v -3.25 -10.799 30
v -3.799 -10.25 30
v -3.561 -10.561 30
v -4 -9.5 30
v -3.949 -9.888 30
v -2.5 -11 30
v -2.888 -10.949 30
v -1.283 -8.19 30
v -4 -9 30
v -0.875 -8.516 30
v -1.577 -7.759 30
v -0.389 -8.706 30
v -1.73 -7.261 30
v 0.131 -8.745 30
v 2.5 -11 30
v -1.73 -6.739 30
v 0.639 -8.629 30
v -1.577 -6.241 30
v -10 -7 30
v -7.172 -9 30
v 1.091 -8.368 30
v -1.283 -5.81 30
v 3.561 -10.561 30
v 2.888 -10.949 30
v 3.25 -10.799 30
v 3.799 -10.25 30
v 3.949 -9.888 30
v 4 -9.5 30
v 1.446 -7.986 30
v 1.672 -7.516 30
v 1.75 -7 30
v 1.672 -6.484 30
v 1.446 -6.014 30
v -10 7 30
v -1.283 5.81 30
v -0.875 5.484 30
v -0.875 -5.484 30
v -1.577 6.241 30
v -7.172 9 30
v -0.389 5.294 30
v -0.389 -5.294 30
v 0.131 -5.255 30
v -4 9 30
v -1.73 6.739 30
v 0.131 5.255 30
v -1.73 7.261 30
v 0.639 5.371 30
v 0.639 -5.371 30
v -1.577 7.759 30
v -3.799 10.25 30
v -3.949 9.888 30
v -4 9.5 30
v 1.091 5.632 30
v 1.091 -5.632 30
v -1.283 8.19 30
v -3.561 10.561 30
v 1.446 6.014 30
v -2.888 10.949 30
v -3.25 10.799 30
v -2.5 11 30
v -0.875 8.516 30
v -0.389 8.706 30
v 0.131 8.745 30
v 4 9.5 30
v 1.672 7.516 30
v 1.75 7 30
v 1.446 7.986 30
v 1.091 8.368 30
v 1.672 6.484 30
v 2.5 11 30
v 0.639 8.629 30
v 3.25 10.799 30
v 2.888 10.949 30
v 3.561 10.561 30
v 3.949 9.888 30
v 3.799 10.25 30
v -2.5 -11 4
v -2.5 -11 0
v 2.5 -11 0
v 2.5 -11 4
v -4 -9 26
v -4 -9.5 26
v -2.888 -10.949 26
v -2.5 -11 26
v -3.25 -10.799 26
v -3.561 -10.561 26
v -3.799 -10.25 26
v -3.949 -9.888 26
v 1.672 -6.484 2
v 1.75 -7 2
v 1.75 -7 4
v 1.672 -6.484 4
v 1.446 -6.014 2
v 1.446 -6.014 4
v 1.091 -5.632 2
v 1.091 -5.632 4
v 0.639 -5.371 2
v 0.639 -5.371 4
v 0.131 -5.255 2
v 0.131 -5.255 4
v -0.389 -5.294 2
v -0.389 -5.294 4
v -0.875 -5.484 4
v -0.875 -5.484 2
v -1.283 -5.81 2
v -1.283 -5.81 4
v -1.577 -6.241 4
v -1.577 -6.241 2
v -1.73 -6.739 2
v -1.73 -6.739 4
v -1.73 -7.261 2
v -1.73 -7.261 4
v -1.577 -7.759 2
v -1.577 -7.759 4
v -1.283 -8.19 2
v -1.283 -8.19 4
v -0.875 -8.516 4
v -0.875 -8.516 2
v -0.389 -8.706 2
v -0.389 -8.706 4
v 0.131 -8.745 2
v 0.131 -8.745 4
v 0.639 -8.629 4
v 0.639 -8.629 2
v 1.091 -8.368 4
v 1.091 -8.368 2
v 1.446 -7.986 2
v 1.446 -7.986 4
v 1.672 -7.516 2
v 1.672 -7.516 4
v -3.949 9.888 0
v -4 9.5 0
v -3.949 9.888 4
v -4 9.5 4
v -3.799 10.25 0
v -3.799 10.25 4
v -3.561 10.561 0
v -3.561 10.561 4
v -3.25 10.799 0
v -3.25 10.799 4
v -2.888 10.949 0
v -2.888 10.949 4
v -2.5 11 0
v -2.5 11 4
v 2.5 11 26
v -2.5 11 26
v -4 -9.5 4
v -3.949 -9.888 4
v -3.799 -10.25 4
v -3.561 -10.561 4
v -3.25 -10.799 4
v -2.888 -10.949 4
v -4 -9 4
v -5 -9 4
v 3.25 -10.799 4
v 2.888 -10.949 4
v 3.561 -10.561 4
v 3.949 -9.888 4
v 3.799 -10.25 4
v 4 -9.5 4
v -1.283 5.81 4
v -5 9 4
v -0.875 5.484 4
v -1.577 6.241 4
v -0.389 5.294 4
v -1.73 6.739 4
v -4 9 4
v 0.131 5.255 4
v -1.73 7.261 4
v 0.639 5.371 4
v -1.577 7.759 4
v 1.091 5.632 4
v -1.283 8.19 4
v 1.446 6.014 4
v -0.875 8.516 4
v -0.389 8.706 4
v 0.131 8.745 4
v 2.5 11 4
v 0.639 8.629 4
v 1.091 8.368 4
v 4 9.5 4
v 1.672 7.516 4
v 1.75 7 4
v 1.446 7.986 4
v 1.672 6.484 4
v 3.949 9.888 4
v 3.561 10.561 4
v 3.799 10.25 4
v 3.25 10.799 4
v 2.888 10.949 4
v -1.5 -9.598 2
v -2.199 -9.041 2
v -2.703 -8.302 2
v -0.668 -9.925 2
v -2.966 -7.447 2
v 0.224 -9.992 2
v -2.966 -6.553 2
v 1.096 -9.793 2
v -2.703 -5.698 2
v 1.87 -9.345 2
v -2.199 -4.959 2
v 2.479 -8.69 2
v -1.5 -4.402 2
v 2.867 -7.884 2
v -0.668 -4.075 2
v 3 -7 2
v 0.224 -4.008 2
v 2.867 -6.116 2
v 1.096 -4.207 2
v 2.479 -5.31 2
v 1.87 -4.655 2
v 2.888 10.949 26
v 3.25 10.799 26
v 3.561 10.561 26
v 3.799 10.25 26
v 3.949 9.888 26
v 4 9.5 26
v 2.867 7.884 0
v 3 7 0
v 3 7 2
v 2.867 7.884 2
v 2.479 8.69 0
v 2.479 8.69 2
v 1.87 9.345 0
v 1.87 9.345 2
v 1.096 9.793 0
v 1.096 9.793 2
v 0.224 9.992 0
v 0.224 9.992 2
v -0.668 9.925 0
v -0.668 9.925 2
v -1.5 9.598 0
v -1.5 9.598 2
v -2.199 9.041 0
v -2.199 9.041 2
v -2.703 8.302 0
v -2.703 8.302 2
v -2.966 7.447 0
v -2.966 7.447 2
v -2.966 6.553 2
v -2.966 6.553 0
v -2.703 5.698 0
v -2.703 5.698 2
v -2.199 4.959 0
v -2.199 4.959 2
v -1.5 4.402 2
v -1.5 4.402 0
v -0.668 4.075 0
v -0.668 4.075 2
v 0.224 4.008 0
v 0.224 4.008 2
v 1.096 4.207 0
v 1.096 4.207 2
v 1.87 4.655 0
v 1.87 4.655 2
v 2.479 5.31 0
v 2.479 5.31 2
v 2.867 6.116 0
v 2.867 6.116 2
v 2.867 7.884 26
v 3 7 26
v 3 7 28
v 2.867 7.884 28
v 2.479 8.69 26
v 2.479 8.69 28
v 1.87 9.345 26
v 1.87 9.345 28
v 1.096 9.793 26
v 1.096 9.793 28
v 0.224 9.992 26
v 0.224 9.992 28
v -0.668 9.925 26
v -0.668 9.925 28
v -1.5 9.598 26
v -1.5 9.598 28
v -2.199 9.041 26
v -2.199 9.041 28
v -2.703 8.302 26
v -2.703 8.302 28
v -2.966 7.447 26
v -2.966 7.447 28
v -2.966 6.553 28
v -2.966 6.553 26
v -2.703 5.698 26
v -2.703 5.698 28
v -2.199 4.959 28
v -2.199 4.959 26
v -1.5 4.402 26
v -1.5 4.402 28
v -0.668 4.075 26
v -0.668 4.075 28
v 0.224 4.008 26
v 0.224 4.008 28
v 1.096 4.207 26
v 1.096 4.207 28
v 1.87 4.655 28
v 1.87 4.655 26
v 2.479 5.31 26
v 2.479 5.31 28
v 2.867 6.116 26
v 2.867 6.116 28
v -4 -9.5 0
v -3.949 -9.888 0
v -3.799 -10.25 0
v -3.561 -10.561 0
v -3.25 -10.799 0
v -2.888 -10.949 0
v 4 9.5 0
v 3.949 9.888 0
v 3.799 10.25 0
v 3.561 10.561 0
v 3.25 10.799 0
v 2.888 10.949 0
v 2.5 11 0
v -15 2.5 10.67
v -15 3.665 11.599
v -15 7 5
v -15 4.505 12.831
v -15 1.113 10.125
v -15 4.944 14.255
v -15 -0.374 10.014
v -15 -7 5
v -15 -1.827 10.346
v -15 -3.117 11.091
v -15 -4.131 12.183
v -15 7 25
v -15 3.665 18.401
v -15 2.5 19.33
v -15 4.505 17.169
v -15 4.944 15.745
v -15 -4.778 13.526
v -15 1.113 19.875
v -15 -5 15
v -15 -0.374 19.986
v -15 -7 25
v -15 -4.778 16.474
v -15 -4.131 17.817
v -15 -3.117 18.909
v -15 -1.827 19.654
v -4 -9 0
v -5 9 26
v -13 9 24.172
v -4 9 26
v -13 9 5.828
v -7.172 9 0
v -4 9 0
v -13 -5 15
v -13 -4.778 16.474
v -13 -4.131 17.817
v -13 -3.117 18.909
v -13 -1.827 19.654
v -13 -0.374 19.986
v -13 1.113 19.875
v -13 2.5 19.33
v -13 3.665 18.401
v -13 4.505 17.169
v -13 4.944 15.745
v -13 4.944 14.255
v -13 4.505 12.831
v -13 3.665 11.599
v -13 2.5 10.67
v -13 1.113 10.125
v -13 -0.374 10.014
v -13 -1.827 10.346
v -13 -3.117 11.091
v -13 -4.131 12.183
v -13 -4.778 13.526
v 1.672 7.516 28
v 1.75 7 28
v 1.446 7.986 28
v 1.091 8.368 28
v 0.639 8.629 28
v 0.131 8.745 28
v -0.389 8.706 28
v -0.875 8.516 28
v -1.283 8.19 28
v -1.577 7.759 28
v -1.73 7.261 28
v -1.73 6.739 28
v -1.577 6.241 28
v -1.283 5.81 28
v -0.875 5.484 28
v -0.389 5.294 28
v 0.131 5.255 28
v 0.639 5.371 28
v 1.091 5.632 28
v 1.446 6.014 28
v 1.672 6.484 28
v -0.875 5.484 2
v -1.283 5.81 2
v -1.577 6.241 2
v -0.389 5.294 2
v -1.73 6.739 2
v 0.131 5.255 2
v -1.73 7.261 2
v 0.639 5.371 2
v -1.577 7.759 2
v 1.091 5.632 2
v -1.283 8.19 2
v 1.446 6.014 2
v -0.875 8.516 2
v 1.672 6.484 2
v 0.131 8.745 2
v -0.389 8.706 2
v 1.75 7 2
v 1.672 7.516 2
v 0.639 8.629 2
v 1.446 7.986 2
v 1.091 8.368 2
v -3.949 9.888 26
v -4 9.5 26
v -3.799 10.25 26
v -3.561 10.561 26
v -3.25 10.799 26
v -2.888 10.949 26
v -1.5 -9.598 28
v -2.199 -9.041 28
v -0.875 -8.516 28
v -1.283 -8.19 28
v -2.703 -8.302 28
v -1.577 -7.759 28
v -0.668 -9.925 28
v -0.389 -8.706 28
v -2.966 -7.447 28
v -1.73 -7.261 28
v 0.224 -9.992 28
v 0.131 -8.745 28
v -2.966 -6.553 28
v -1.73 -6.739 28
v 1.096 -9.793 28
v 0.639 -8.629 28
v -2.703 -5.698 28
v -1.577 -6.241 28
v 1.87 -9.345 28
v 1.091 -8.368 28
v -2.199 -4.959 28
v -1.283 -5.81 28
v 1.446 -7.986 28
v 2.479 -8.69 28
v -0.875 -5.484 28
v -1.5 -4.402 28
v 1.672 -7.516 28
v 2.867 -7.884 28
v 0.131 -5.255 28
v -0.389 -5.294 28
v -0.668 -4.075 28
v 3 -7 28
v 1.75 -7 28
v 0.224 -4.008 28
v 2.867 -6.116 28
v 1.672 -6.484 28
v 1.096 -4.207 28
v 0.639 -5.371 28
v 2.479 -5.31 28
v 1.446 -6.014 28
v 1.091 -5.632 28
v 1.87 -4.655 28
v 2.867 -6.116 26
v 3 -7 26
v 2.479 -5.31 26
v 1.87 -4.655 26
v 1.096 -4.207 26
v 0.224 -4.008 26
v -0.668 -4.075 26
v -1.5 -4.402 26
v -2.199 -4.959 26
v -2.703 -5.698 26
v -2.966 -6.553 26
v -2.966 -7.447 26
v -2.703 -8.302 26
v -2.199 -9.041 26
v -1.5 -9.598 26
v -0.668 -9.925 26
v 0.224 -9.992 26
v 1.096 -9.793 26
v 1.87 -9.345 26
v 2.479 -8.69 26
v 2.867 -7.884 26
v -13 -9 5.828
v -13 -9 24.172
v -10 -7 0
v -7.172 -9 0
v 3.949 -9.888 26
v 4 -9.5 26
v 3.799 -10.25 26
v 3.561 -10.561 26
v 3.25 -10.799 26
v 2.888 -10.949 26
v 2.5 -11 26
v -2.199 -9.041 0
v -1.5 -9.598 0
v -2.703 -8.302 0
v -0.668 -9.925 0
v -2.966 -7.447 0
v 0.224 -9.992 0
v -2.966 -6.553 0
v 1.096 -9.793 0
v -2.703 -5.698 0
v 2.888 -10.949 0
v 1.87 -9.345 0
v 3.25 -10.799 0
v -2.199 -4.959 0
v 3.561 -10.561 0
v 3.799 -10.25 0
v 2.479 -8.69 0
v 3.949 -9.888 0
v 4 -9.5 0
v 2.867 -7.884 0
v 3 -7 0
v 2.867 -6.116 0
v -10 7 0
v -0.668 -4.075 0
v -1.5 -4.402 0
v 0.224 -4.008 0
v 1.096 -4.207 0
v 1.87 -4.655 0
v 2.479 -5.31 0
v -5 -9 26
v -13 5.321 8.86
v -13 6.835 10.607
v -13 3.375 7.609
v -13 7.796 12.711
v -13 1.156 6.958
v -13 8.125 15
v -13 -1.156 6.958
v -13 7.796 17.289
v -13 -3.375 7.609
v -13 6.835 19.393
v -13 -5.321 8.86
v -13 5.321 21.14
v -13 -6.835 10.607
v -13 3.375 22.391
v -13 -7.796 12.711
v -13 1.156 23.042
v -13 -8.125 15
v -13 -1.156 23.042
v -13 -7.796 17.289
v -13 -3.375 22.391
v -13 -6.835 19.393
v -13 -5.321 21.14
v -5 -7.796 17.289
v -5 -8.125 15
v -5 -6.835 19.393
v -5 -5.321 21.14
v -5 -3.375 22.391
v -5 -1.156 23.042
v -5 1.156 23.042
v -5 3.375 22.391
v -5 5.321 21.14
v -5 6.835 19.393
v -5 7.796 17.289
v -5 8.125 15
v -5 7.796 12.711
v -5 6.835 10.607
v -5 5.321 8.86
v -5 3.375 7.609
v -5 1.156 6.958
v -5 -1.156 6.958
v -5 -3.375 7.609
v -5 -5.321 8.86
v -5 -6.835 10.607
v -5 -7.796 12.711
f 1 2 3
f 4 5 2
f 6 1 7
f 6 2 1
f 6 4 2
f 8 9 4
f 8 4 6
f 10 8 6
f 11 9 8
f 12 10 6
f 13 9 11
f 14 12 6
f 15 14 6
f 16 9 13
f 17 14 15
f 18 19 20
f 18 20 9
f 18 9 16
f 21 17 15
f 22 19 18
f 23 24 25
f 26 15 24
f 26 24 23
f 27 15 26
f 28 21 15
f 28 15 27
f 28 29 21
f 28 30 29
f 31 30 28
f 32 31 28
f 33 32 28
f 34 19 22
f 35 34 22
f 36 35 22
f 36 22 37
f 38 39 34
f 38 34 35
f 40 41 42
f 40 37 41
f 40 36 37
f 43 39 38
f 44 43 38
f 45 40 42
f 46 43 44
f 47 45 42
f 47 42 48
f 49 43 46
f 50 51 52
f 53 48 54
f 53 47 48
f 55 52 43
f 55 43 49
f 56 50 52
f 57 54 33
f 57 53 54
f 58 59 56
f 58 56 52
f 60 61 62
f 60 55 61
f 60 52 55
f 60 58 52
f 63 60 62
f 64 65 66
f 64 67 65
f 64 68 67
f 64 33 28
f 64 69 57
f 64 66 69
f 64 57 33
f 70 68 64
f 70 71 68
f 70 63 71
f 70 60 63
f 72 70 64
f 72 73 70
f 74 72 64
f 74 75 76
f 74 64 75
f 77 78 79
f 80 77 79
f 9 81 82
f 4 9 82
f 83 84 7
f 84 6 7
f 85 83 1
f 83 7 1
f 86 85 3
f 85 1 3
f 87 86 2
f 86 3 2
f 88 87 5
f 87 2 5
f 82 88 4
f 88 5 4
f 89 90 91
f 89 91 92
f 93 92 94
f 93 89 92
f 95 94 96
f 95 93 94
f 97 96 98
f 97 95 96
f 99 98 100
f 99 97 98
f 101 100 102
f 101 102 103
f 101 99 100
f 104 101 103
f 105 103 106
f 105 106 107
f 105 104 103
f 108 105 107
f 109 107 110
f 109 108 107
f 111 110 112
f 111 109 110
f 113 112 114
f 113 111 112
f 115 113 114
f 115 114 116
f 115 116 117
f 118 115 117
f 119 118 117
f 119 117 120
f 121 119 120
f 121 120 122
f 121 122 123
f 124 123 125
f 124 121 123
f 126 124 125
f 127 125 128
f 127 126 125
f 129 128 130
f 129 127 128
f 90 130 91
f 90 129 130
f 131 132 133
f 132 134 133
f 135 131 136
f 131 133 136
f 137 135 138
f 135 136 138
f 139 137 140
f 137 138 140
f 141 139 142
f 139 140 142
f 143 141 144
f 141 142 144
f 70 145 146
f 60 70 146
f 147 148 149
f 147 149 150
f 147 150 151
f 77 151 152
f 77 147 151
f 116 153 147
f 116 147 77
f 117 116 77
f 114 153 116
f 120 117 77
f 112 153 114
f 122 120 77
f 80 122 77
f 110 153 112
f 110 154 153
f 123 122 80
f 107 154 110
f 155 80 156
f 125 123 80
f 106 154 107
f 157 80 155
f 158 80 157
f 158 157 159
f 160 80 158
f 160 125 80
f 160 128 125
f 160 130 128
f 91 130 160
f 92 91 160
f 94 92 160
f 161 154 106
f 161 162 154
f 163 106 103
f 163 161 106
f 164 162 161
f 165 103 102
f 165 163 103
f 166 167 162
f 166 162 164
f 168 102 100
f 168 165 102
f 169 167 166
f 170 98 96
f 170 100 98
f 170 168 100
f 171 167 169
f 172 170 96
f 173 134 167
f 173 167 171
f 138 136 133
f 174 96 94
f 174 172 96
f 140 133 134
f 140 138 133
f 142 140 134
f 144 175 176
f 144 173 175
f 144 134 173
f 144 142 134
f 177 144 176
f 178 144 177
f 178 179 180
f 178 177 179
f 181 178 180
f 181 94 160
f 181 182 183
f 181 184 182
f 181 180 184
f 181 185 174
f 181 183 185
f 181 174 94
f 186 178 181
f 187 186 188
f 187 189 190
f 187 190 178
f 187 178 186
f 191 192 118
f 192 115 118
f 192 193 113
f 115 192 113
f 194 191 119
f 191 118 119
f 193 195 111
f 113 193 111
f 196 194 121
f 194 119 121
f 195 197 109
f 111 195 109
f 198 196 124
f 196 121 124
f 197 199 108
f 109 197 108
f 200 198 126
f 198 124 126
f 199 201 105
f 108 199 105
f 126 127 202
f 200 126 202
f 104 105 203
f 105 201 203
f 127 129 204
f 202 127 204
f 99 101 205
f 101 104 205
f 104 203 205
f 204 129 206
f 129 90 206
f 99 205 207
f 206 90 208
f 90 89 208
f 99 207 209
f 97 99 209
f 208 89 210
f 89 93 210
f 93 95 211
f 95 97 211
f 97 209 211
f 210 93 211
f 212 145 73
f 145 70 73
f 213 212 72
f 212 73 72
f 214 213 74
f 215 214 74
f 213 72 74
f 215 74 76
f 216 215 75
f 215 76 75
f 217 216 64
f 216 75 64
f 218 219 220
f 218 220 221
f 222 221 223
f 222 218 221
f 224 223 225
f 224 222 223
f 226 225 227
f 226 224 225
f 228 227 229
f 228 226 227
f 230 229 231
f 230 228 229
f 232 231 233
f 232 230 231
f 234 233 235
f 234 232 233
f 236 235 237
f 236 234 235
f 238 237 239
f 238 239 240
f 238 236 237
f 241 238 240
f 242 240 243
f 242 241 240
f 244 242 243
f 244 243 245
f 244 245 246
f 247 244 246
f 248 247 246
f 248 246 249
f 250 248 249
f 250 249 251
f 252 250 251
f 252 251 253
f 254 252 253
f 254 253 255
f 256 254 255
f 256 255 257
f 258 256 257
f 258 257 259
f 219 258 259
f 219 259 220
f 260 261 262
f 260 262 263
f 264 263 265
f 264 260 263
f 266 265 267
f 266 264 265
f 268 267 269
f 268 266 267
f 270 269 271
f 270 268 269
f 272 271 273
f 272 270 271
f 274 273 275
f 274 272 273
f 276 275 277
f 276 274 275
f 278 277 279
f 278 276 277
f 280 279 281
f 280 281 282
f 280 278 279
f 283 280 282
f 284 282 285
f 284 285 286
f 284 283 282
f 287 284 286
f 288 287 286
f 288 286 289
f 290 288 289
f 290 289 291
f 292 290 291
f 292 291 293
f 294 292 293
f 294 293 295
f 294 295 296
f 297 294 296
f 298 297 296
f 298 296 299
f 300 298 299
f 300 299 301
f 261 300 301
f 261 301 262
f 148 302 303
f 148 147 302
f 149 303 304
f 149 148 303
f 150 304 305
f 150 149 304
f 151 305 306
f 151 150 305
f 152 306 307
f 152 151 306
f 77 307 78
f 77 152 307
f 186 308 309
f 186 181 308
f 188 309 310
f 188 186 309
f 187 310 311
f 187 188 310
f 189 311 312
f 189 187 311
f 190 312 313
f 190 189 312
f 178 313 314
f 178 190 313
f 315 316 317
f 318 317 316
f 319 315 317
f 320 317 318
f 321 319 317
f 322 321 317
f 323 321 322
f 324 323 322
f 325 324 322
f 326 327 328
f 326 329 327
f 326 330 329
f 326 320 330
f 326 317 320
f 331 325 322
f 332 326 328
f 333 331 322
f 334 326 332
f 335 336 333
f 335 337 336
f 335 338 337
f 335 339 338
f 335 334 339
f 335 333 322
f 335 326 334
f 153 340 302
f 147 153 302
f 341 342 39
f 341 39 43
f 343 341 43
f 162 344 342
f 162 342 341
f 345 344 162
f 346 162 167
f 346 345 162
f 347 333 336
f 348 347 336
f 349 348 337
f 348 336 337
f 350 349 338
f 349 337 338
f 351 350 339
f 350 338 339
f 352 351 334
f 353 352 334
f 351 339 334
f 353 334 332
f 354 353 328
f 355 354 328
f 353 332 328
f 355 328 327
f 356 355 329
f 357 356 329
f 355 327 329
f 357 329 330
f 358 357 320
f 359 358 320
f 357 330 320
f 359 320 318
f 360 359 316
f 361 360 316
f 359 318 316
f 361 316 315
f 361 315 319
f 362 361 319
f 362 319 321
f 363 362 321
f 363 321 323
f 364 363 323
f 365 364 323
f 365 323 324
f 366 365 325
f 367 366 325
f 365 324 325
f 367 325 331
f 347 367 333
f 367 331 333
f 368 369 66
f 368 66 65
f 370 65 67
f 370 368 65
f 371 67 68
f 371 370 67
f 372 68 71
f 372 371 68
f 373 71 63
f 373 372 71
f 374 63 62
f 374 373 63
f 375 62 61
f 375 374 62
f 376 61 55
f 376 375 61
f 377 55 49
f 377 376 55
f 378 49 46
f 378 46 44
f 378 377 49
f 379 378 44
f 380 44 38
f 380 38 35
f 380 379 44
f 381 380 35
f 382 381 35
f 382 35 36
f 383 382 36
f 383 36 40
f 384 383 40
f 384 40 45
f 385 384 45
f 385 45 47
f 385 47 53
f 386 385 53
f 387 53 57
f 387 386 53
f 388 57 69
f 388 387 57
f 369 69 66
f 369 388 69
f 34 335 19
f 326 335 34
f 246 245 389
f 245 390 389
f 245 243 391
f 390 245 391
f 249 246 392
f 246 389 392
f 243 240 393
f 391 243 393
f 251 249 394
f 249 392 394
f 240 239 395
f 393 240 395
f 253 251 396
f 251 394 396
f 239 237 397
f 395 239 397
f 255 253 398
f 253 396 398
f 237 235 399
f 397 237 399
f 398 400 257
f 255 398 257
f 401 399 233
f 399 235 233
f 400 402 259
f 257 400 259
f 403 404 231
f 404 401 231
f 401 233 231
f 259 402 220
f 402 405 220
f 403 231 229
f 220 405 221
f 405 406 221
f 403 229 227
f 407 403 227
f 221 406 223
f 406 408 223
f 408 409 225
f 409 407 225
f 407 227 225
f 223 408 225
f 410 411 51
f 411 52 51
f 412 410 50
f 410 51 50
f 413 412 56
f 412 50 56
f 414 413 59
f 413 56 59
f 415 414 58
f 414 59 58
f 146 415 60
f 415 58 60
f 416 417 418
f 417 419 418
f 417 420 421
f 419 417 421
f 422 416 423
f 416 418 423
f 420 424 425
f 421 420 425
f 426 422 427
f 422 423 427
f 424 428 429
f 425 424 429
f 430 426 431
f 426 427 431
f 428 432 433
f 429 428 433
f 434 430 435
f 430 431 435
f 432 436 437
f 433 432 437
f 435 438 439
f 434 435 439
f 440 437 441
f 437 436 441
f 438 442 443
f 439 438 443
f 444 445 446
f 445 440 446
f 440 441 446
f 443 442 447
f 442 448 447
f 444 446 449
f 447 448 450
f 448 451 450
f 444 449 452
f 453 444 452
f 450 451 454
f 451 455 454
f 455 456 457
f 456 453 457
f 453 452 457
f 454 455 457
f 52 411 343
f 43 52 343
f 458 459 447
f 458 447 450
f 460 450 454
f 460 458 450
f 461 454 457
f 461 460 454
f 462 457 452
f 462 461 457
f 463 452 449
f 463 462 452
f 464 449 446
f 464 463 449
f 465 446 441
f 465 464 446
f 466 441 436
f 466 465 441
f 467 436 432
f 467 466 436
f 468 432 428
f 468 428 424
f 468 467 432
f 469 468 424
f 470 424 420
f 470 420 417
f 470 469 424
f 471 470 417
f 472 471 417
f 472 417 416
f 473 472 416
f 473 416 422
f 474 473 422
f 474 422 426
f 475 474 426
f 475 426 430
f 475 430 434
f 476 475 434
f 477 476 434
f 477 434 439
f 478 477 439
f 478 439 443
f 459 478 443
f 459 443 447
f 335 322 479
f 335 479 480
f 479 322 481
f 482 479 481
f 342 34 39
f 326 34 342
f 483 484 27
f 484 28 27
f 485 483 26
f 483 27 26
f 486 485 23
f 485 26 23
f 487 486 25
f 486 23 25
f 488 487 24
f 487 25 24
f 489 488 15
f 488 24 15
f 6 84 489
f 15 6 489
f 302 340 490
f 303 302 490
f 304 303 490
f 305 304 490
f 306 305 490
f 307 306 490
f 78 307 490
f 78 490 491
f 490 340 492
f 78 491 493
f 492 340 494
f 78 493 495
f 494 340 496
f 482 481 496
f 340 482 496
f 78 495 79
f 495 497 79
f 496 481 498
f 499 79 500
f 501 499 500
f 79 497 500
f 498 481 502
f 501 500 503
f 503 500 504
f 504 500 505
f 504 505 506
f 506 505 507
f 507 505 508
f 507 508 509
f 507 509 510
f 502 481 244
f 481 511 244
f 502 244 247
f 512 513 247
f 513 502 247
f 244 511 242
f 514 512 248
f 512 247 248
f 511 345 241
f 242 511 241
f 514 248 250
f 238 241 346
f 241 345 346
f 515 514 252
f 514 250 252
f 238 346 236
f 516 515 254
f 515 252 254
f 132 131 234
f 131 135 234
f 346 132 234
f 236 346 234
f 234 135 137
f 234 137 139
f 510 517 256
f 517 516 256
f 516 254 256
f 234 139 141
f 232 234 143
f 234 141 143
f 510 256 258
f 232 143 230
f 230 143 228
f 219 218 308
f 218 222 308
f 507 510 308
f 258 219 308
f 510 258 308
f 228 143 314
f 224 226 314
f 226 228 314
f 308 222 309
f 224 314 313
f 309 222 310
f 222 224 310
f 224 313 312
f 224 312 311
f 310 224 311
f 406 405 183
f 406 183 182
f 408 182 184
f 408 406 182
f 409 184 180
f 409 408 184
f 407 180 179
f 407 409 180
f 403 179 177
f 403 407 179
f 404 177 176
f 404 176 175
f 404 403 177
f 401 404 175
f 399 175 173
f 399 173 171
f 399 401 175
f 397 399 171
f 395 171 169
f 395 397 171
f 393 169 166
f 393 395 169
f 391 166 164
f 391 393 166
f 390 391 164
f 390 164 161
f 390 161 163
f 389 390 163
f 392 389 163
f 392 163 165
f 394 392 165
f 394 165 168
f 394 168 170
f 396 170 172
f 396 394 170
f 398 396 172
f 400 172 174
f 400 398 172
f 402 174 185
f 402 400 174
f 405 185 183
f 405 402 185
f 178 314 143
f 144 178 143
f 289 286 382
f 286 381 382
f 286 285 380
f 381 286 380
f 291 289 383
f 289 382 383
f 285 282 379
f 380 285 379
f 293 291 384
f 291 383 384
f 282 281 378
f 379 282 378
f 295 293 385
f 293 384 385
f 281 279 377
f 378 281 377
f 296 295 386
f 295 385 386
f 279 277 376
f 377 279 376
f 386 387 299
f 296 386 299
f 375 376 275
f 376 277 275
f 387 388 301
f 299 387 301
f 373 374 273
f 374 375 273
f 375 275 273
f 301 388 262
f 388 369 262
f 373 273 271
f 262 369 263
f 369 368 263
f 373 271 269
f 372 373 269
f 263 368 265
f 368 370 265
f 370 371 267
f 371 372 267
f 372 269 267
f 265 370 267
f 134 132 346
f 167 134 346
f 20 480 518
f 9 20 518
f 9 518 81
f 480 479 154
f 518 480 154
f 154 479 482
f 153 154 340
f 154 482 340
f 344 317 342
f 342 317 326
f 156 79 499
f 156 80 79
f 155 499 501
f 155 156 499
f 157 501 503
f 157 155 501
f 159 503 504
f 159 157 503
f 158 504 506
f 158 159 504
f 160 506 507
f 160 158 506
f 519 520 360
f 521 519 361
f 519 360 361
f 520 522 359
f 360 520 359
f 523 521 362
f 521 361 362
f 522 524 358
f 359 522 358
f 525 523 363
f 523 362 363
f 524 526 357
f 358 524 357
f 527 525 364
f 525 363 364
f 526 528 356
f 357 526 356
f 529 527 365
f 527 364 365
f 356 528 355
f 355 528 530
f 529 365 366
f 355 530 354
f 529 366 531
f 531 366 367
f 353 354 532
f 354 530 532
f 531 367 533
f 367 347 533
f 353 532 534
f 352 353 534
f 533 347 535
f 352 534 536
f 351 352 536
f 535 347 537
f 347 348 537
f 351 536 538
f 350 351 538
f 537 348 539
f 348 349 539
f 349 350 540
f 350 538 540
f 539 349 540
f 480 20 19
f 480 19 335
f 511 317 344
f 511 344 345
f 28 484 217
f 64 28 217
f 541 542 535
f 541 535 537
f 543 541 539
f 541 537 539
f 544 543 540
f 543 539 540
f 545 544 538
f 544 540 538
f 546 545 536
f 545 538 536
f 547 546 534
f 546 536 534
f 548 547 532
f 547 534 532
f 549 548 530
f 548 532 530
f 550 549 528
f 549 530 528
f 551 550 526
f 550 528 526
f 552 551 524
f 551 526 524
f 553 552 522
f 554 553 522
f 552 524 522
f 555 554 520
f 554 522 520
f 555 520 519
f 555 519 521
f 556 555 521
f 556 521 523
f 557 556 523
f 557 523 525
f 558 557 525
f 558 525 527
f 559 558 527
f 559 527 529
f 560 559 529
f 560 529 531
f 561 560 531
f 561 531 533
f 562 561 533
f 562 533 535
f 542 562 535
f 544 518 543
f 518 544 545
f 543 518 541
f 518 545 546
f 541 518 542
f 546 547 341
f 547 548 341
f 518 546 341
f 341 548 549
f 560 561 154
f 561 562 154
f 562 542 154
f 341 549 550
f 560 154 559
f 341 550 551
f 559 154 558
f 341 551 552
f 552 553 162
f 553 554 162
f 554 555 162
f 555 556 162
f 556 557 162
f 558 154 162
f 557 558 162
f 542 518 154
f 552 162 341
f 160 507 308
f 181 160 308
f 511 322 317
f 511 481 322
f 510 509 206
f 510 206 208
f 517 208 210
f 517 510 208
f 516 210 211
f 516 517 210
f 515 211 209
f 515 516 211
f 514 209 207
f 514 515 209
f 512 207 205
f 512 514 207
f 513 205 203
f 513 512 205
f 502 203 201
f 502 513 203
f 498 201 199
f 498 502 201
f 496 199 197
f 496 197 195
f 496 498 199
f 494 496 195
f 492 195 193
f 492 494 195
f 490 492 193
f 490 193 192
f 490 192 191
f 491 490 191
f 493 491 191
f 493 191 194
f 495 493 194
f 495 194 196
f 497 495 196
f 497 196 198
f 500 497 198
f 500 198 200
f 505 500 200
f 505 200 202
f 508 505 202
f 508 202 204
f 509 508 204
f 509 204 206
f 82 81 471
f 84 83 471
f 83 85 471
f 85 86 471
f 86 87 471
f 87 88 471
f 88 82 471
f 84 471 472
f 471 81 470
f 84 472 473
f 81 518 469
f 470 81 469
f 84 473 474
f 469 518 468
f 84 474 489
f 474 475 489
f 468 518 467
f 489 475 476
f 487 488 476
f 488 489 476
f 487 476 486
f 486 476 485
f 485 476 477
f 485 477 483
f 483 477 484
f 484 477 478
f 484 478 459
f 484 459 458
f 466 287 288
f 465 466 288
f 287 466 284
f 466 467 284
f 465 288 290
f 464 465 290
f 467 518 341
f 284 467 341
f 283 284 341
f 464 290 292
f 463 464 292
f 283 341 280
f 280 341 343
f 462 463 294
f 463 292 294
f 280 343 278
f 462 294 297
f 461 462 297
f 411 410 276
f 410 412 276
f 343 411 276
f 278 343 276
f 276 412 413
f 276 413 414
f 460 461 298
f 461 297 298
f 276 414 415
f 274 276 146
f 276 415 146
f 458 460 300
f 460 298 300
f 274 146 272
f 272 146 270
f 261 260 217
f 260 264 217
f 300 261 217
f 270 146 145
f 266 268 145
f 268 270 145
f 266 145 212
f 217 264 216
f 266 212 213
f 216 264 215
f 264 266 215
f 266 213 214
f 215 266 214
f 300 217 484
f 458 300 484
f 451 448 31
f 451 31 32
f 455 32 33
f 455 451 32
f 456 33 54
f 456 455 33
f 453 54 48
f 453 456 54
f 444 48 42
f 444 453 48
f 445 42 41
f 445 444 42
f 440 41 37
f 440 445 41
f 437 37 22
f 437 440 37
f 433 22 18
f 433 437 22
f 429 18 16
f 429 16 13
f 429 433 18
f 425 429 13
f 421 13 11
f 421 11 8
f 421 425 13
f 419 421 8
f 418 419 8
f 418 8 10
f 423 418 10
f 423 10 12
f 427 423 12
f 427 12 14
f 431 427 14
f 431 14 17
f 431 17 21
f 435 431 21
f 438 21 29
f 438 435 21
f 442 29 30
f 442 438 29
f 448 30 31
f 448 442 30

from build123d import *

# Parameters (mm, degrees)
F2_R      = 3
F2_W      = 1
F2_H      = 18
F3_DEPTH  = 4
F4_START  = 2
F2_R_2    = 1.75
F4_DEPTH  = 2
F2_W_2    = 10
F5_DEPTH  = 30
F6_START  = 26
F6_DEPTH  = 4
F7_R      = 8.125
F7_R_2    = 5
F8_DEPTH  = 10
F9_DEPTH  = 2
F10_START = 28
F10_DEPTH = 2
F11_SIZE  = 5
F12_SIZE  = 2
F13_R     = 1.5


# Not quite as in the source:
# - a feature names something its author has since deleted; it is built from what else it names


with BuildPart() as f3:
    # F2 (on Top) → F3 (new body)
    with BuildSketch(Plane.XY):
        Polygon((4, 11), (-4, 11), (-4, 9), (-4, -9), (-4, -11), (4, -11), align=None)
        with Locations((0, -7)):
            Circle(F2_R, mode=Mode.SUBTRACT)
        with Locations((0, 7)):
            Circle(F2_R, mode=Mode.SUBTRACT)
        with Locations((-4.5, 0)):
            Rectangle(F2_W, F2_H)
    extrude(amount=F3_DEPTH)

    # F2 (on Top) → F4 (join)
    with BuildSketch(Plane.XY.offset(F4_START)):
        with Locations((0, -7)):
            Circle(F2_R)
        with Locations((0, -7)):
            Circle(F2_R_2, mode=Mode.SUBTRACT)
        with Locations((0, 7)):
            Circle(F2_R)
        with Locations((0, 7)):
            Circle(F2_R_2, mode=Mode.SUBTRACT)
    extrude(amount=F4_DEPTH)

    # F2 (on Top) → F5 (join)
    with BuildSketch(Plane.XY):
        with Locations((-10, 0)):
            Rectangle(F2_W_2, F2_H)
    extrude(amount=F5_DEPTH)

    # F2 (on Top) → F6 (join)
    with BuildSketch(Plane.XY.offset(F6_START)):
        Polygon((4, 11), (-4, 11), (-4, 9), (-4, -9), (-4, -11), (4, -11), align=None)
        with Locations((0, -7)):
            Circle(F2_R, mode=Mode.SUBTRACT)
        with Locations((0, 7)):
            Circle(F2_R, mode=Mode.SUBTRACT)
        with Locations((-4.5, 0)):
            Rectangle(F2_W, F2_H)
    extrude(amount=F6_DEPTH)

    # F7 (on face) → F8 (cut)
    with BuildSketch(Plane(origin=(-15, 0, 0), x_dir=(0, -1, 0), z_dir=(-1, 0, 0))):
        with Locations((0, 15)):
            Circle(F7_R)
        with Locations((0, 15)):
            Circle(F7_R_2, mode=Mode.SUBTRACT)
        with Locations((0, 15)):
            Circle(F7_R_2)
    extrude(amount=-F8_DEPTH, mode=Mode.SUBTRACT)

    # F7 (on face) → F9 (join)
    with BuildSketch(Plane(origin=(-15, 0, 0), x_dir=(0, -1, 0), z_dir=(-1, 0, 0))):
        with Locations((0, 15)):
            Circle(F7_R)
        with Locations((0, 15)):
            Circle(F7_R_2, mode=Mode.SUBTRACT)
    extrude(amount=-F9_DEPTH)

    # F2 (on Top) → F10 (join)
    with BuildSketch(Plane.XY.offset(F10_START)):
        with Locations((0, 7)):
            Circle(F2_R)
        with Locations((0, 7)):
            Circle(F2_R_2, mode=Mode.SUBTRACT)
        with Locations((0, -7)):
            Circle(F2_R)
        with Locations((0, -7)):
            Circle(F2_R_2, mode=Mode.SUBTRACT)
    extrude(amount=F10_DEPTH)

    # F11
    f11_edges = [f3.edges().sort_by_distance(p)[0] for p in [
        (-15, 0, 0),
        (-15, 0, 30),
    ]]
    chamfer(f11_edges, length=F11_SIZE)

    # F12
    f12_edges = [f3.edges().sort_by_distance(p)[0] for p in [
        (-15, -9, 15),
        (-15, 9, 15),
        (-12.5, 9, 27.5),
        (-12.5, -9, 27.5),
        (-12.5, 9, 2.5),
        (-12.5, -9, 2.5),
    ]]
    chamfer(f12_edges, length=F12_SIZE)

    # F13
    f13_edges = [f3.edges().sort_by_distance(p)[0] for p in [
        (4, 11, 2),
        (4, -11, 2),
        (-4, -11, 2),
        (-4, 11, 2),
        (4, 11, 28),
        (-4, 11, 28),
        (-4, -11, 28),
        (4, -11, 28),
    ]]
    fillet(f13_edges, radius=F13_R)


solid = f3.part
